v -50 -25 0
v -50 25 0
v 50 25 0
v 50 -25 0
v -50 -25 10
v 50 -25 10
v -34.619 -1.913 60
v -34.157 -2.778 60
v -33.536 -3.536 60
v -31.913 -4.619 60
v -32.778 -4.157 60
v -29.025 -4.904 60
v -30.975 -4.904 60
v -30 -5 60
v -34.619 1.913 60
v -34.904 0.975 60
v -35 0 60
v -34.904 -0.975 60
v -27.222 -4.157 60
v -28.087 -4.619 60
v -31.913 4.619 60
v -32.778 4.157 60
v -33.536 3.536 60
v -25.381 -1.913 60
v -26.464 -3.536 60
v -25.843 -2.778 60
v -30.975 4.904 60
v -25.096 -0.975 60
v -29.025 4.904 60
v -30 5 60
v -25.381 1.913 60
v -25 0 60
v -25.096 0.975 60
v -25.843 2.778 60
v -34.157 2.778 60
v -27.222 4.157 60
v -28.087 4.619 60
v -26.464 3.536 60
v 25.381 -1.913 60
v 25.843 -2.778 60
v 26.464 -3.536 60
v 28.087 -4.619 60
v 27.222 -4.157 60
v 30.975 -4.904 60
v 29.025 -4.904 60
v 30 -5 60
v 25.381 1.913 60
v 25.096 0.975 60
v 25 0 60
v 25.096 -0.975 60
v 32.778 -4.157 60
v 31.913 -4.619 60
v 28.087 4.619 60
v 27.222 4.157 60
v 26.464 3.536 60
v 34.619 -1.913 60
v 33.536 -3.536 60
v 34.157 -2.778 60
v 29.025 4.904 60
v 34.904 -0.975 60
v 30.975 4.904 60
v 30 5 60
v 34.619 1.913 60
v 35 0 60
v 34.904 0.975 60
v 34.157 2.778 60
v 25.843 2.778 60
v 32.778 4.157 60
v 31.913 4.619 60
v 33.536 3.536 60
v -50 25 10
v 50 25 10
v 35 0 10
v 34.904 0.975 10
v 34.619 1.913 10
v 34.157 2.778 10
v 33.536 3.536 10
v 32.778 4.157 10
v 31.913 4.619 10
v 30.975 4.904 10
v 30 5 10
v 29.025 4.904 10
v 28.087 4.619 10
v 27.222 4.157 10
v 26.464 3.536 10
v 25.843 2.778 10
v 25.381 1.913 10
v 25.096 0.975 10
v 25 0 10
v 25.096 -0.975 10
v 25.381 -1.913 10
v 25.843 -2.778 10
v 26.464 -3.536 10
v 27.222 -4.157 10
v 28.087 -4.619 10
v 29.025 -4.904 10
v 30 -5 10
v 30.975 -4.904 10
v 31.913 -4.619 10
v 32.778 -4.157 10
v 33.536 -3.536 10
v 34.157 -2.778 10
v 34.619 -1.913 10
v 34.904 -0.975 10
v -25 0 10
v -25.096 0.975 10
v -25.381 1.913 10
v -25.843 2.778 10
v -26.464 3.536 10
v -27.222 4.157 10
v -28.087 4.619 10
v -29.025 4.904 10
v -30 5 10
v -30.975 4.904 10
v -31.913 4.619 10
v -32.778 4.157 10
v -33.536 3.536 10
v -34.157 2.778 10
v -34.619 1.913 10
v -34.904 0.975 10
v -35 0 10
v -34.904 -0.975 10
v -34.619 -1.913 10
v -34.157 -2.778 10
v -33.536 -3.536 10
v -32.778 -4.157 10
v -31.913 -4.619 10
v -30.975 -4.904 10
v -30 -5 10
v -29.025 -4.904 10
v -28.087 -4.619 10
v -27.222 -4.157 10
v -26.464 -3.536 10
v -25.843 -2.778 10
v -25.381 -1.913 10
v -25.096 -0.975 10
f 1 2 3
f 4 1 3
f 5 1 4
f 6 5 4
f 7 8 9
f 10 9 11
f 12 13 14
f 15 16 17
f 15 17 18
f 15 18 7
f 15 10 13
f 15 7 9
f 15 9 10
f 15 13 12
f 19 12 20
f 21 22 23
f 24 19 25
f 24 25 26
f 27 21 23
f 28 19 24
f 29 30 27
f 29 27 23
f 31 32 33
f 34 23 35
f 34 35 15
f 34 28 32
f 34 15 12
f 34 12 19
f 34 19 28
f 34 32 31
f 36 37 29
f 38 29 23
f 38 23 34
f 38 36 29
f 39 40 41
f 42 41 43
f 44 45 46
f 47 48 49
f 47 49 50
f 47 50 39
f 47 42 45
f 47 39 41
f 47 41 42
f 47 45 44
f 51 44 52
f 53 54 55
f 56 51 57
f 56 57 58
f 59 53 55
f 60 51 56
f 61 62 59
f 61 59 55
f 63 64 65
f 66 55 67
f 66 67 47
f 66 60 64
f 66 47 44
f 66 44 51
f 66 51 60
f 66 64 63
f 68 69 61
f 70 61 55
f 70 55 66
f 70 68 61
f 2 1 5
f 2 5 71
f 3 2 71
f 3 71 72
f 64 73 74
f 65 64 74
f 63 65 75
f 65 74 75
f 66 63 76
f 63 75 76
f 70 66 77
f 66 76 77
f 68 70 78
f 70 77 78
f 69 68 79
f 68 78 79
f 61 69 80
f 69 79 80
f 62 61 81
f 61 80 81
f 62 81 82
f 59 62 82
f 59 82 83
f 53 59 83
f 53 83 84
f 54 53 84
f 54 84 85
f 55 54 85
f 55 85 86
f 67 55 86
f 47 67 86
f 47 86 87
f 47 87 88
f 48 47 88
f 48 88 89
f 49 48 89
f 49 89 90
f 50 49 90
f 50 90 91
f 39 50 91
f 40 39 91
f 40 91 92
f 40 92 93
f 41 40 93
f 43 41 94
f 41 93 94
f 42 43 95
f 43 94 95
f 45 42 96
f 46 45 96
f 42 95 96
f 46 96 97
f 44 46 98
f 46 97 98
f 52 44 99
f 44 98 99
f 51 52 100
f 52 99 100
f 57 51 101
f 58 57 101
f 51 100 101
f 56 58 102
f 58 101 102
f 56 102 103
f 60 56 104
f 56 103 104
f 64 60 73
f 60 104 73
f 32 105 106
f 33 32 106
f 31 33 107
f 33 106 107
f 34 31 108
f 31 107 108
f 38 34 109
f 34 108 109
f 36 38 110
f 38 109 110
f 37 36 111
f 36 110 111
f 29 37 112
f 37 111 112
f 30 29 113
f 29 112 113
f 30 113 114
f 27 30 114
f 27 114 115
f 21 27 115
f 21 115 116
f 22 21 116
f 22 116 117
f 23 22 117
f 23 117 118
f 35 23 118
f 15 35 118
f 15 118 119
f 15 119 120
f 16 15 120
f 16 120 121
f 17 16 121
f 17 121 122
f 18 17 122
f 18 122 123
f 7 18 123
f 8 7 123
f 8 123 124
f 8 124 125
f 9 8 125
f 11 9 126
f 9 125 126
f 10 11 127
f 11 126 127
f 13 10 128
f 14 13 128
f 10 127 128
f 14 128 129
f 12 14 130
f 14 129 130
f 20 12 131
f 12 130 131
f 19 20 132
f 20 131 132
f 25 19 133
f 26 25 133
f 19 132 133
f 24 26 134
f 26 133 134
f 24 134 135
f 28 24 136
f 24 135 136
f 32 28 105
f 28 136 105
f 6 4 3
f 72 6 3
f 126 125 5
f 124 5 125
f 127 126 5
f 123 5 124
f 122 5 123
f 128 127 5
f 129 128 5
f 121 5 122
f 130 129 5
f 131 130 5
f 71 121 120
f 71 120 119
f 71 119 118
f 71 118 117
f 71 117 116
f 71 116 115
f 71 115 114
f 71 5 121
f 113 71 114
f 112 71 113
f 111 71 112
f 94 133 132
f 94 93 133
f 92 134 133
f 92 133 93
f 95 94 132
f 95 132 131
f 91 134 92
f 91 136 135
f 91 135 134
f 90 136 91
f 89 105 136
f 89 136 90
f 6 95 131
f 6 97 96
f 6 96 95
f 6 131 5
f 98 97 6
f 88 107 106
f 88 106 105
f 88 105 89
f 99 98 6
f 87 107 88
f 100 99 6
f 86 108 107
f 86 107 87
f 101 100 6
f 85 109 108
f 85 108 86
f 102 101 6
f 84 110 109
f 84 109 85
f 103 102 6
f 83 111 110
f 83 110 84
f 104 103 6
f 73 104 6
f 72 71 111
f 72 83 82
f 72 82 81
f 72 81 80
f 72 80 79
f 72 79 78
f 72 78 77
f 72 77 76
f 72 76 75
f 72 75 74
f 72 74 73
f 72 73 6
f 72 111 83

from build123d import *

# Parameters (mm, degrees)
SKETCH1_W           = 100
SKETCH1_H           = 50
BOSS_EXTRUDE1_DEPTH = 10
SKETCH1_3_R         = 5
BOSS_EXTRUDE2_DEPTH = 60


with BuildPart() as part:
    # Sketch1 → Boss-Extrude1 (new body)
    with BuildSketch(Plane.XY):
        Rectangle(SKETCH1_W, SKETCH1_H)
    extrude(amount=BOSS_EXTRUDE1_DEPTH)

    # Sketch1<3> → Boss-Extrude2 (add)
    with BuildSketch(Plane.XY):
        with Locations((-30, 0)):
            Circle(SKETCH1_3_R)
        with Locations((30, 0)):
            Circle(SKETCH1_3_R)
    extrude(amount=BOSS_EXTRUDE2_DEPTH)


solid = part.part
